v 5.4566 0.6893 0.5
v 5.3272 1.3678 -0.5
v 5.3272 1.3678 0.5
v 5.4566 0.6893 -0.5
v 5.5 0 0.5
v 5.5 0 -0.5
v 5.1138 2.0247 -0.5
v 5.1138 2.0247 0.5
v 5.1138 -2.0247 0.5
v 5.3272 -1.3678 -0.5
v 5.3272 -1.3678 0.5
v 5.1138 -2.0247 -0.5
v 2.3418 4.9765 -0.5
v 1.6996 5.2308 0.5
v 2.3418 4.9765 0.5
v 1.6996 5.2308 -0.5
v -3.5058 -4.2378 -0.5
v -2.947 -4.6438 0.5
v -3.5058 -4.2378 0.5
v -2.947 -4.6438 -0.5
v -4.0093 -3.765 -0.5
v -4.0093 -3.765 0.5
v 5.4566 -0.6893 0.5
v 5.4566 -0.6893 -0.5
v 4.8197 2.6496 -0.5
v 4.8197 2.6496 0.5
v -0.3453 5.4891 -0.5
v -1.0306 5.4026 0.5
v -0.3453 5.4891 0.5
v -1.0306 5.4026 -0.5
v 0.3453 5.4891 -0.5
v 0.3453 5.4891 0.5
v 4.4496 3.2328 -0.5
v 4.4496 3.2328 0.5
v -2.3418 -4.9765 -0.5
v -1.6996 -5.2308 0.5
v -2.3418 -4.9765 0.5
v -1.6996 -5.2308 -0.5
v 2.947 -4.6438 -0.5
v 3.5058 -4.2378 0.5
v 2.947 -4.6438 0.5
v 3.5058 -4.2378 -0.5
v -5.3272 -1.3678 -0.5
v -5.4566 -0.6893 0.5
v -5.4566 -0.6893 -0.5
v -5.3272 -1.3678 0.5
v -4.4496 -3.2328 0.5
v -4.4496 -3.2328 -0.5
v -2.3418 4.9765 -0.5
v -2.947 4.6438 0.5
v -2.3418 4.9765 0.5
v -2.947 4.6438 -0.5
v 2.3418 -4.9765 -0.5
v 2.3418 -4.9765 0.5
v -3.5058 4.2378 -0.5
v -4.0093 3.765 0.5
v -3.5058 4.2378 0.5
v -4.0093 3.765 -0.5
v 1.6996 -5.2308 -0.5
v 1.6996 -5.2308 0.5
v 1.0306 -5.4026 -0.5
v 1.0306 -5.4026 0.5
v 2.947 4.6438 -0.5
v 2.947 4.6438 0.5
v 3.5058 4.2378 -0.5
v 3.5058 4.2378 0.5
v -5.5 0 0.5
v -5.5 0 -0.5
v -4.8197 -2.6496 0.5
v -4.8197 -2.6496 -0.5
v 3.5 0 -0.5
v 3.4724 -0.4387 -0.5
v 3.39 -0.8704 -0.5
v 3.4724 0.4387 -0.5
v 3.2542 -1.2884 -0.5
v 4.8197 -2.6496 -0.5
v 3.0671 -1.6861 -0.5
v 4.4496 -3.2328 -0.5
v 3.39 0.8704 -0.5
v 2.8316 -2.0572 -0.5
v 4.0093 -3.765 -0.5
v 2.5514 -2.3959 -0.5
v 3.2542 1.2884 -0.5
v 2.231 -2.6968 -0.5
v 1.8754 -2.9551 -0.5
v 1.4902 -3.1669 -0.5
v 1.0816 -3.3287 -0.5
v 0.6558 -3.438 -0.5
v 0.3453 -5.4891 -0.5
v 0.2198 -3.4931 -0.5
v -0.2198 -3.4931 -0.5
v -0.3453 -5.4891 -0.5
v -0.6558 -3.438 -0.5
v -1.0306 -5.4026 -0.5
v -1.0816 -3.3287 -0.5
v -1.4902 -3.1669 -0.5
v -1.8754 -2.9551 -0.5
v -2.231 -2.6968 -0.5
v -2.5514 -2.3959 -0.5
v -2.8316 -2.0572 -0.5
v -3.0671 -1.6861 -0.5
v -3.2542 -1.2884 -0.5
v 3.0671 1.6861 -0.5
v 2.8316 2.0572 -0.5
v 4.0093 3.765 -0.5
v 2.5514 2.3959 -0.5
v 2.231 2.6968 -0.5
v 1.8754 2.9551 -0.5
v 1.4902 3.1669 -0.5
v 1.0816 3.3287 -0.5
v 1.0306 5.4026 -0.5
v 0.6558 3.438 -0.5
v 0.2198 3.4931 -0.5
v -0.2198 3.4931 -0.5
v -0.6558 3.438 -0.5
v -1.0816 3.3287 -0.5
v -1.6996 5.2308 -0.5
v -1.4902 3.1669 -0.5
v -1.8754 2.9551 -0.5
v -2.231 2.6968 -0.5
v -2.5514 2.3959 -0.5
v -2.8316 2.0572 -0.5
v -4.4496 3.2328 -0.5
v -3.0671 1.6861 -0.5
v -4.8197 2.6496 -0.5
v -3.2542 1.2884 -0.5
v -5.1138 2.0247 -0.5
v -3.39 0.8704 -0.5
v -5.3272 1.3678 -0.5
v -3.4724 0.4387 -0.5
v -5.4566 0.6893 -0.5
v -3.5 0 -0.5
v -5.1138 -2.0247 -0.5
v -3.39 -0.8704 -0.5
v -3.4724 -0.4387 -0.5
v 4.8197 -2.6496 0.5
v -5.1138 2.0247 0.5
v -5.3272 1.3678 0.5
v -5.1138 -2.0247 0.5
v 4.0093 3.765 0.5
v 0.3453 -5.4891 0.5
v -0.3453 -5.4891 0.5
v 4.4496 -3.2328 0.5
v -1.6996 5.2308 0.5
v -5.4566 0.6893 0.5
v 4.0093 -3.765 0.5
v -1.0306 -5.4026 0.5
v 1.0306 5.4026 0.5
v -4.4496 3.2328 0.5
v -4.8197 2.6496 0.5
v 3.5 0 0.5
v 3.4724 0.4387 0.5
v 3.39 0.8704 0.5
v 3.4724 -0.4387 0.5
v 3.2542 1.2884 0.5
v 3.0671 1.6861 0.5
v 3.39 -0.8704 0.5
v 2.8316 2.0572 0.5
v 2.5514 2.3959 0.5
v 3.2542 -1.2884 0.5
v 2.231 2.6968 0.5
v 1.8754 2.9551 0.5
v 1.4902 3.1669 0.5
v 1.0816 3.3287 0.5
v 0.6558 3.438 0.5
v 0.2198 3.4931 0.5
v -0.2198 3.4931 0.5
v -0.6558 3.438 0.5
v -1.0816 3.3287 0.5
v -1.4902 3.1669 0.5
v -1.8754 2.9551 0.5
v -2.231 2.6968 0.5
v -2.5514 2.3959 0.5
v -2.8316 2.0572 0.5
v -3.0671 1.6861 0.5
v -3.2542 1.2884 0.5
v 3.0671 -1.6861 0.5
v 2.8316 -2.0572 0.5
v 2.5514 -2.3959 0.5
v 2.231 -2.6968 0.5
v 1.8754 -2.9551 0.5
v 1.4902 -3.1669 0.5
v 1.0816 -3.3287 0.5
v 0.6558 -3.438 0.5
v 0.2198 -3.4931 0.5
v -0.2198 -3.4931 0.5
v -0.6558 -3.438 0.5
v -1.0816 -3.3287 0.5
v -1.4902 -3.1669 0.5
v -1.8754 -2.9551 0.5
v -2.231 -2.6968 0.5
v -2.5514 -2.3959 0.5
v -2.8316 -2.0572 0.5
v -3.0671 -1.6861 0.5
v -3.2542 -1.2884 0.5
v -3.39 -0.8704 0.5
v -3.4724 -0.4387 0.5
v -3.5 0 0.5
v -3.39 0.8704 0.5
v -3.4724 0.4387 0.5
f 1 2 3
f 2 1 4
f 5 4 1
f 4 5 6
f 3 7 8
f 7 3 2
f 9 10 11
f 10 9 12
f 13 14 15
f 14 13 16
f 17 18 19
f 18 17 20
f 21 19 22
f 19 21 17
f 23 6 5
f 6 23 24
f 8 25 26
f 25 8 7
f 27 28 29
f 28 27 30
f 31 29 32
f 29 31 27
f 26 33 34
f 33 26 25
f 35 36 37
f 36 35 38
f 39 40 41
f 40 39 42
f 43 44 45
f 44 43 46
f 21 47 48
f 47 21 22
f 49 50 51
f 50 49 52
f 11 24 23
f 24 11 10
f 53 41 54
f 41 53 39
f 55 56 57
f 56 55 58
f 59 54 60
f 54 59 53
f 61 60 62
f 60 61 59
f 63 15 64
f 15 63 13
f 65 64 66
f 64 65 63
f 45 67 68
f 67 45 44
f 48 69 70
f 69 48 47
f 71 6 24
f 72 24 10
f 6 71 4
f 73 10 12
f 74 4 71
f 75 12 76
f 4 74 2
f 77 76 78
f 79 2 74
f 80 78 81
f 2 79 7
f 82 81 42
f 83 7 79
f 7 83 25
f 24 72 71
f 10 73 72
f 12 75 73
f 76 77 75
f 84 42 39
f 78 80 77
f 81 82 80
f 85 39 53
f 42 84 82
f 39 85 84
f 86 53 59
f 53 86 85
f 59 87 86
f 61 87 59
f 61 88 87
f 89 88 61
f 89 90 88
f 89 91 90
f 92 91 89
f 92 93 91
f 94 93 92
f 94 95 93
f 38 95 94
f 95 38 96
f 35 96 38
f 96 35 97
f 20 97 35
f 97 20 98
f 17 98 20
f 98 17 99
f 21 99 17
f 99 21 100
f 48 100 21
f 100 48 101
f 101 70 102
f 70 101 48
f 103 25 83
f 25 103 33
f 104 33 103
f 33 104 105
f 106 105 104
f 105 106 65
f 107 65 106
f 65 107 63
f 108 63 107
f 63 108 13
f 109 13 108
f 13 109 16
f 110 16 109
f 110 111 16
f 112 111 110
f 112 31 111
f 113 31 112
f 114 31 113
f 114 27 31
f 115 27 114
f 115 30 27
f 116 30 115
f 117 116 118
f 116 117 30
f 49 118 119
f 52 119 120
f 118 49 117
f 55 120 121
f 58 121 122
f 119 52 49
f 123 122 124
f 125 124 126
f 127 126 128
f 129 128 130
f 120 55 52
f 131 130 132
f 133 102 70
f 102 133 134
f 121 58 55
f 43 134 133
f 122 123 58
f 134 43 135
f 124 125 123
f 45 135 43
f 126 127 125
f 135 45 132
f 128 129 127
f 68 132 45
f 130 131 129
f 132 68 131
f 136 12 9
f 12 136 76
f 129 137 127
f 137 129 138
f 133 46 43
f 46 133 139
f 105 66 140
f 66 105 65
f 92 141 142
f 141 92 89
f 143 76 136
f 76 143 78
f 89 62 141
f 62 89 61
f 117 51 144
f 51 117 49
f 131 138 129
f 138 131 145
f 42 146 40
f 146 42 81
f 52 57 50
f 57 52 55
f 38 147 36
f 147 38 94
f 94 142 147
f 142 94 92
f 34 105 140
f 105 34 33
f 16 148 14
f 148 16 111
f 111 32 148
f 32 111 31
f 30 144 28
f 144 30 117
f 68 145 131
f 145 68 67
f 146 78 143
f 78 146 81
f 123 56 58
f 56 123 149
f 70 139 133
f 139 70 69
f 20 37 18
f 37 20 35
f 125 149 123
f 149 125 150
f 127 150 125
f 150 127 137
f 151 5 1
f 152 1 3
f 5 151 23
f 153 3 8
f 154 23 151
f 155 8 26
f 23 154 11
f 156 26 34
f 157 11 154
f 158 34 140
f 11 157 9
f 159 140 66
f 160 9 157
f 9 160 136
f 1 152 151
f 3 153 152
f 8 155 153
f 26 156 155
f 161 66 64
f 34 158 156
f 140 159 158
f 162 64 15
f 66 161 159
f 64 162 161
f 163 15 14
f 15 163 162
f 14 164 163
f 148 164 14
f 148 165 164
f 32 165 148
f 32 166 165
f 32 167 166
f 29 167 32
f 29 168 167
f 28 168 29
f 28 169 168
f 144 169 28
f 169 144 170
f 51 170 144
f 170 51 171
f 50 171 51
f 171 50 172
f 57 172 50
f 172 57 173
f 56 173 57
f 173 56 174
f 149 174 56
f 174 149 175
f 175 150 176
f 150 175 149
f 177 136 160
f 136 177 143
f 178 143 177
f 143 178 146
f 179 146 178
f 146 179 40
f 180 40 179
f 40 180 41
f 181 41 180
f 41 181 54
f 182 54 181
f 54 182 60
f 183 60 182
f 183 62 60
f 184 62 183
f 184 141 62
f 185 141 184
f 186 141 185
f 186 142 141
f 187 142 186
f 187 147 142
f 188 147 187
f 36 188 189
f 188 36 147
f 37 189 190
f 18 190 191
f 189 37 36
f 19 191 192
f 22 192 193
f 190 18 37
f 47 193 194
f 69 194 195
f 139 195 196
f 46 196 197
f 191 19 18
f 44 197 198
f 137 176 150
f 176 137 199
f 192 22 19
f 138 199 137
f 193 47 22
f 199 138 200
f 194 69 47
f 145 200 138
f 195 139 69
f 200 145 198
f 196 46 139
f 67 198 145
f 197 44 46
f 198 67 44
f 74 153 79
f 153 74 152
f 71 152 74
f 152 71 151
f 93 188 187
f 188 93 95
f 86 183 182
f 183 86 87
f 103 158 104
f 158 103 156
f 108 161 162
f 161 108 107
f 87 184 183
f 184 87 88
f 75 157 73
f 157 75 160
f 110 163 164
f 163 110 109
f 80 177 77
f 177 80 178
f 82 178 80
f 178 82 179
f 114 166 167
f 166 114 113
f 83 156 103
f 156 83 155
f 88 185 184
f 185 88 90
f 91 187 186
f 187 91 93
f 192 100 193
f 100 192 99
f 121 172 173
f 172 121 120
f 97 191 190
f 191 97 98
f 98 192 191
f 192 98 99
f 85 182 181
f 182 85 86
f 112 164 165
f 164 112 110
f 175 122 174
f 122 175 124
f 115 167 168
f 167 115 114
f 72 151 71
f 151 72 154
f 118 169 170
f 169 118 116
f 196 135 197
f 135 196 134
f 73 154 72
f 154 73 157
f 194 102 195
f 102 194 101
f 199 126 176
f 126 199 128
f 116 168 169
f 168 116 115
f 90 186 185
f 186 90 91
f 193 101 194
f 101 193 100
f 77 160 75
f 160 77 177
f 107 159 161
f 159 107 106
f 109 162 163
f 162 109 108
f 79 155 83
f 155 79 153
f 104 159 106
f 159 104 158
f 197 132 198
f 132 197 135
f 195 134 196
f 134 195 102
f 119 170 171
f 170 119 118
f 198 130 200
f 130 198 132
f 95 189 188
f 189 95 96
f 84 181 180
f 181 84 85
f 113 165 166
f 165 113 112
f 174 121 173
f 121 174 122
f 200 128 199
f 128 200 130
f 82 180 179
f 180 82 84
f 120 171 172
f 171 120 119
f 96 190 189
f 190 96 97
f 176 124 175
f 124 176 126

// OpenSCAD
$fn = 50;


difference() {
	union() {
		translate(v = [0, 0, -0.5000000000]) {
			cylinder(h = 1, r = 5.5000000000);
		}
	}
	union() {
		translate(v = [0, 0, -100.0000000000]) {
			cylinder(h = 200, r = 3.5000000000);
		}
	}
}
